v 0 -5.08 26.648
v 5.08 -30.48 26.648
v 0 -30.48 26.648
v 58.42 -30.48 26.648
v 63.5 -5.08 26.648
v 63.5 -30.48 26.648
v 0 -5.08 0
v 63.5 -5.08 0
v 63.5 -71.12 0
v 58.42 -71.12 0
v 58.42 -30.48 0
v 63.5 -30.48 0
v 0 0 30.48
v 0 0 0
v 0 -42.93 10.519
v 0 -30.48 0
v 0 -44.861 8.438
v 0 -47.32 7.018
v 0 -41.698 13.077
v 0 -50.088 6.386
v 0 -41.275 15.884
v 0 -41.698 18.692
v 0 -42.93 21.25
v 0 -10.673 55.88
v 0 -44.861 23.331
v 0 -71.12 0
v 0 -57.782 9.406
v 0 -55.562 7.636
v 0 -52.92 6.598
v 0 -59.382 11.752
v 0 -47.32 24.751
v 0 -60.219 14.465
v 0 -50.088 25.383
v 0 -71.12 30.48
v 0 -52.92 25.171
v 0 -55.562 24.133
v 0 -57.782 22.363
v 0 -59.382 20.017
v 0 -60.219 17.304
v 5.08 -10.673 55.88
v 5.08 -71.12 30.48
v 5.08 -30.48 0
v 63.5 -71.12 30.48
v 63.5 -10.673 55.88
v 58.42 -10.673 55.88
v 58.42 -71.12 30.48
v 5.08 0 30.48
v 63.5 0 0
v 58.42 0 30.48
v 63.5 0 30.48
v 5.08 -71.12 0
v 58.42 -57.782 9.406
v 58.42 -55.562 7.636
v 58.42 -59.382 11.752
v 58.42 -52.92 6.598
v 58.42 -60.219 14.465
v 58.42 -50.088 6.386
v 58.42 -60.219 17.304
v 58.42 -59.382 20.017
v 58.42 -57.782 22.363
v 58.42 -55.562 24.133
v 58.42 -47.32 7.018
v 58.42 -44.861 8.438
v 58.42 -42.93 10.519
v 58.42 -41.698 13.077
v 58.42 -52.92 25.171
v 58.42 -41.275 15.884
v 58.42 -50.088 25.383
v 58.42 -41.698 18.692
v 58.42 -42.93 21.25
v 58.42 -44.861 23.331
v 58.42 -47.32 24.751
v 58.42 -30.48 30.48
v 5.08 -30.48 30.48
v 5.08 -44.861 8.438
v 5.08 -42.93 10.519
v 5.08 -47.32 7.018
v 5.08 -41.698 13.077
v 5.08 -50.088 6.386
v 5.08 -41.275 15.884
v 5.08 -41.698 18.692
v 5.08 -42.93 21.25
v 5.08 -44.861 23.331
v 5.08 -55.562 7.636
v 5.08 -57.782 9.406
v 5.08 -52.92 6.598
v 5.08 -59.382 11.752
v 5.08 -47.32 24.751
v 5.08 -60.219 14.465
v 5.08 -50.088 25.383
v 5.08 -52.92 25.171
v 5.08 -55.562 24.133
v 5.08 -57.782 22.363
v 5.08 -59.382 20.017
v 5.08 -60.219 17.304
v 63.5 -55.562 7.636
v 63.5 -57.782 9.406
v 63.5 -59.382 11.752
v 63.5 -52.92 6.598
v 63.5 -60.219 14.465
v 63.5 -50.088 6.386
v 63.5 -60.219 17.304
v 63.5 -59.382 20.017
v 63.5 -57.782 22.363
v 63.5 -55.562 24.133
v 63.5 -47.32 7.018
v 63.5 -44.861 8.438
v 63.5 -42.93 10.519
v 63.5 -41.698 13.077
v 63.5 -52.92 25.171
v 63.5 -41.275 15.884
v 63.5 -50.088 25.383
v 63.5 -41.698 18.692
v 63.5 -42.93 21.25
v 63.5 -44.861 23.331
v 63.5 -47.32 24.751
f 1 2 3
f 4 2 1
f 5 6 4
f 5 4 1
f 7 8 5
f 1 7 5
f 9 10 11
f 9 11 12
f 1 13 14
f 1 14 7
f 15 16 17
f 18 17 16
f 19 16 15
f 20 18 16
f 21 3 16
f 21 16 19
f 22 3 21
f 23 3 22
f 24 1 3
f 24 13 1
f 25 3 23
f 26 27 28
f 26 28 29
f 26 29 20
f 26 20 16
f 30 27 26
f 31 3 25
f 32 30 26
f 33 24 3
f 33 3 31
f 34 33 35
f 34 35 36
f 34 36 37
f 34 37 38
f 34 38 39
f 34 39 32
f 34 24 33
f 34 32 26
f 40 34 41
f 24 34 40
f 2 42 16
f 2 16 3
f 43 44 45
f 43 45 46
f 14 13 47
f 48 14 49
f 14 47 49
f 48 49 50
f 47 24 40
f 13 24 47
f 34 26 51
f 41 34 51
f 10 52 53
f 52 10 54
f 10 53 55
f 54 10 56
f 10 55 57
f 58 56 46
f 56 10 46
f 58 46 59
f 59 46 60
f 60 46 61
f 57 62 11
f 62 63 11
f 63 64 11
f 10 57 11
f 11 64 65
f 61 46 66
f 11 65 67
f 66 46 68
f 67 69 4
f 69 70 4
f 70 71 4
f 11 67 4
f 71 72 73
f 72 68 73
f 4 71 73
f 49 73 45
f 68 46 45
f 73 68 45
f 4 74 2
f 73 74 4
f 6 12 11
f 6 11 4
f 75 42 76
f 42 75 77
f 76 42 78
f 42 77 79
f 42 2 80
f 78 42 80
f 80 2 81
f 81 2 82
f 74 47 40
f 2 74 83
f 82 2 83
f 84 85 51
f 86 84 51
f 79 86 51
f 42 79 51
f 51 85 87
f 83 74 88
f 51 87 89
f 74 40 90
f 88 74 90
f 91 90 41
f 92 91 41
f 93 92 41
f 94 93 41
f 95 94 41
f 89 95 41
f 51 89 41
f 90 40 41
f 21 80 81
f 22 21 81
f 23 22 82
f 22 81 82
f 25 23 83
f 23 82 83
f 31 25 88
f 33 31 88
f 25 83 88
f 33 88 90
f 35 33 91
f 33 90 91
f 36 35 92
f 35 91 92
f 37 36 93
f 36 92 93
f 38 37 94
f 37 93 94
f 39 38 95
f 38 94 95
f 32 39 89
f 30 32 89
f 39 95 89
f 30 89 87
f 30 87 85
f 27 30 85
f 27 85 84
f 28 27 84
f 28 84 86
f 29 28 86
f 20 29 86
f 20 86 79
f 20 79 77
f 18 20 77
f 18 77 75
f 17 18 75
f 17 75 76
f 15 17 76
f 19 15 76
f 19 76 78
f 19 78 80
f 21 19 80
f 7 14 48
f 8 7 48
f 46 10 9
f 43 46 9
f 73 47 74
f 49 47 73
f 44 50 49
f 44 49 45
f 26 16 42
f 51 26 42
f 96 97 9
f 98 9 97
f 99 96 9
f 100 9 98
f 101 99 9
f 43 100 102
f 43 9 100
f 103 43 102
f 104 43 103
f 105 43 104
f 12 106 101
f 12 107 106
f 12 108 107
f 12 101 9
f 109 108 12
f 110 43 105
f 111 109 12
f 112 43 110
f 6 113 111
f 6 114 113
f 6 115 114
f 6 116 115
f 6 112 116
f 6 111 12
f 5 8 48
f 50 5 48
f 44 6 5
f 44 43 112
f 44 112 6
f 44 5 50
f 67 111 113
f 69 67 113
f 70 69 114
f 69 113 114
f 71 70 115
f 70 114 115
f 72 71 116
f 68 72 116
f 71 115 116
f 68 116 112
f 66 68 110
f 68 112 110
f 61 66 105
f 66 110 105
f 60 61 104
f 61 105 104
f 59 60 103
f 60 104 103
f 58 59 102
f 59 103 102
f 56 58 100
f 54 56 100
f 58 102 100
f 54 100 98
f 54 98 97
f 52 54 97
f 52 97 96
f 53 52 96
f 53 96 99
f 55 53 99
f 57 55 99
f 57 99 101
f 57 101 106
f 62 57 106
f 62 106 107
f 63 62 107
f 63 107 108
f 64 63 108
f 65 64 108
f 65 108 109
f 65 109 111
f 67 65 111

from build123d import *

# Parameters (mm, degrees)
F0_W     = 63.5
F0_H     = 30.48
F1_DEPTH = 71.12
F2_W     = 53.34
F2_H     = 30.48
F3_DEPTH = 40.64
F4_R     = 9.525
F4_W     = 25.4
F4_H     = 26.6478173435
F5_DEPTH = 63.5
F7_DEPTH = 5.08
F9_DEPTH = 5.08


# Not quite as in the source:
# - a feature names something its author has since deleted; it is built from what else it names


with BuildPart() as f1:
    # F0 (on Front) → F1 (new body)
    with BuildSketch(Plane.XZ):
        with Locations((31.75, 15.24)):
            Rectangle(F0_W, F0_H)
    extrude(amount=F1_DEPTH)

    # F2 (on face) → F3 (cut)
    with BuildSketch(Plane.XZ.offset(71.12)):
        with Locations((31.75, 15.24)):
            Rectangle(F2_W, F2_H)
    extrude(amount=-F3_DEPTH, mode=Mode.SUBTRACT)

    # F4 (on face) → F5 (cut)
    with BuildSketch(Plane.YZ.offset(63.5)):
        with Locations((-50.8, 15.8844571561)):
            Circle(F4_R)
        with Locations((-17.78, 13.3239086717)):
            Rectangle(F4_W, F4_H)
    extrude(amount=-F5_DEPTH, mode=Mode.SUBTRACT)

    # F6 (on face) → F7 (join)
    with BuildSketch(Plane.YZ.offset(63.5)):
        Polygon((-10.6731842133, 55.88), (-71.12, 30.48), (0, 30.48), align=None)
    extrude(amount=-F7_DEPTH)

    # F8 (on face) → F9 (join)
    with BuildSketch(Plane(origin=(0, 0, 0), x_dir=(0, -1, 0), z_dir=(-1, 0, 0))):
        Polygon((10.6731842133, 55.88), (0, 30.48), (71.12, 30.48), align=None)
    extrude(amount=-F9_DEPTH)


solid = f1.part
